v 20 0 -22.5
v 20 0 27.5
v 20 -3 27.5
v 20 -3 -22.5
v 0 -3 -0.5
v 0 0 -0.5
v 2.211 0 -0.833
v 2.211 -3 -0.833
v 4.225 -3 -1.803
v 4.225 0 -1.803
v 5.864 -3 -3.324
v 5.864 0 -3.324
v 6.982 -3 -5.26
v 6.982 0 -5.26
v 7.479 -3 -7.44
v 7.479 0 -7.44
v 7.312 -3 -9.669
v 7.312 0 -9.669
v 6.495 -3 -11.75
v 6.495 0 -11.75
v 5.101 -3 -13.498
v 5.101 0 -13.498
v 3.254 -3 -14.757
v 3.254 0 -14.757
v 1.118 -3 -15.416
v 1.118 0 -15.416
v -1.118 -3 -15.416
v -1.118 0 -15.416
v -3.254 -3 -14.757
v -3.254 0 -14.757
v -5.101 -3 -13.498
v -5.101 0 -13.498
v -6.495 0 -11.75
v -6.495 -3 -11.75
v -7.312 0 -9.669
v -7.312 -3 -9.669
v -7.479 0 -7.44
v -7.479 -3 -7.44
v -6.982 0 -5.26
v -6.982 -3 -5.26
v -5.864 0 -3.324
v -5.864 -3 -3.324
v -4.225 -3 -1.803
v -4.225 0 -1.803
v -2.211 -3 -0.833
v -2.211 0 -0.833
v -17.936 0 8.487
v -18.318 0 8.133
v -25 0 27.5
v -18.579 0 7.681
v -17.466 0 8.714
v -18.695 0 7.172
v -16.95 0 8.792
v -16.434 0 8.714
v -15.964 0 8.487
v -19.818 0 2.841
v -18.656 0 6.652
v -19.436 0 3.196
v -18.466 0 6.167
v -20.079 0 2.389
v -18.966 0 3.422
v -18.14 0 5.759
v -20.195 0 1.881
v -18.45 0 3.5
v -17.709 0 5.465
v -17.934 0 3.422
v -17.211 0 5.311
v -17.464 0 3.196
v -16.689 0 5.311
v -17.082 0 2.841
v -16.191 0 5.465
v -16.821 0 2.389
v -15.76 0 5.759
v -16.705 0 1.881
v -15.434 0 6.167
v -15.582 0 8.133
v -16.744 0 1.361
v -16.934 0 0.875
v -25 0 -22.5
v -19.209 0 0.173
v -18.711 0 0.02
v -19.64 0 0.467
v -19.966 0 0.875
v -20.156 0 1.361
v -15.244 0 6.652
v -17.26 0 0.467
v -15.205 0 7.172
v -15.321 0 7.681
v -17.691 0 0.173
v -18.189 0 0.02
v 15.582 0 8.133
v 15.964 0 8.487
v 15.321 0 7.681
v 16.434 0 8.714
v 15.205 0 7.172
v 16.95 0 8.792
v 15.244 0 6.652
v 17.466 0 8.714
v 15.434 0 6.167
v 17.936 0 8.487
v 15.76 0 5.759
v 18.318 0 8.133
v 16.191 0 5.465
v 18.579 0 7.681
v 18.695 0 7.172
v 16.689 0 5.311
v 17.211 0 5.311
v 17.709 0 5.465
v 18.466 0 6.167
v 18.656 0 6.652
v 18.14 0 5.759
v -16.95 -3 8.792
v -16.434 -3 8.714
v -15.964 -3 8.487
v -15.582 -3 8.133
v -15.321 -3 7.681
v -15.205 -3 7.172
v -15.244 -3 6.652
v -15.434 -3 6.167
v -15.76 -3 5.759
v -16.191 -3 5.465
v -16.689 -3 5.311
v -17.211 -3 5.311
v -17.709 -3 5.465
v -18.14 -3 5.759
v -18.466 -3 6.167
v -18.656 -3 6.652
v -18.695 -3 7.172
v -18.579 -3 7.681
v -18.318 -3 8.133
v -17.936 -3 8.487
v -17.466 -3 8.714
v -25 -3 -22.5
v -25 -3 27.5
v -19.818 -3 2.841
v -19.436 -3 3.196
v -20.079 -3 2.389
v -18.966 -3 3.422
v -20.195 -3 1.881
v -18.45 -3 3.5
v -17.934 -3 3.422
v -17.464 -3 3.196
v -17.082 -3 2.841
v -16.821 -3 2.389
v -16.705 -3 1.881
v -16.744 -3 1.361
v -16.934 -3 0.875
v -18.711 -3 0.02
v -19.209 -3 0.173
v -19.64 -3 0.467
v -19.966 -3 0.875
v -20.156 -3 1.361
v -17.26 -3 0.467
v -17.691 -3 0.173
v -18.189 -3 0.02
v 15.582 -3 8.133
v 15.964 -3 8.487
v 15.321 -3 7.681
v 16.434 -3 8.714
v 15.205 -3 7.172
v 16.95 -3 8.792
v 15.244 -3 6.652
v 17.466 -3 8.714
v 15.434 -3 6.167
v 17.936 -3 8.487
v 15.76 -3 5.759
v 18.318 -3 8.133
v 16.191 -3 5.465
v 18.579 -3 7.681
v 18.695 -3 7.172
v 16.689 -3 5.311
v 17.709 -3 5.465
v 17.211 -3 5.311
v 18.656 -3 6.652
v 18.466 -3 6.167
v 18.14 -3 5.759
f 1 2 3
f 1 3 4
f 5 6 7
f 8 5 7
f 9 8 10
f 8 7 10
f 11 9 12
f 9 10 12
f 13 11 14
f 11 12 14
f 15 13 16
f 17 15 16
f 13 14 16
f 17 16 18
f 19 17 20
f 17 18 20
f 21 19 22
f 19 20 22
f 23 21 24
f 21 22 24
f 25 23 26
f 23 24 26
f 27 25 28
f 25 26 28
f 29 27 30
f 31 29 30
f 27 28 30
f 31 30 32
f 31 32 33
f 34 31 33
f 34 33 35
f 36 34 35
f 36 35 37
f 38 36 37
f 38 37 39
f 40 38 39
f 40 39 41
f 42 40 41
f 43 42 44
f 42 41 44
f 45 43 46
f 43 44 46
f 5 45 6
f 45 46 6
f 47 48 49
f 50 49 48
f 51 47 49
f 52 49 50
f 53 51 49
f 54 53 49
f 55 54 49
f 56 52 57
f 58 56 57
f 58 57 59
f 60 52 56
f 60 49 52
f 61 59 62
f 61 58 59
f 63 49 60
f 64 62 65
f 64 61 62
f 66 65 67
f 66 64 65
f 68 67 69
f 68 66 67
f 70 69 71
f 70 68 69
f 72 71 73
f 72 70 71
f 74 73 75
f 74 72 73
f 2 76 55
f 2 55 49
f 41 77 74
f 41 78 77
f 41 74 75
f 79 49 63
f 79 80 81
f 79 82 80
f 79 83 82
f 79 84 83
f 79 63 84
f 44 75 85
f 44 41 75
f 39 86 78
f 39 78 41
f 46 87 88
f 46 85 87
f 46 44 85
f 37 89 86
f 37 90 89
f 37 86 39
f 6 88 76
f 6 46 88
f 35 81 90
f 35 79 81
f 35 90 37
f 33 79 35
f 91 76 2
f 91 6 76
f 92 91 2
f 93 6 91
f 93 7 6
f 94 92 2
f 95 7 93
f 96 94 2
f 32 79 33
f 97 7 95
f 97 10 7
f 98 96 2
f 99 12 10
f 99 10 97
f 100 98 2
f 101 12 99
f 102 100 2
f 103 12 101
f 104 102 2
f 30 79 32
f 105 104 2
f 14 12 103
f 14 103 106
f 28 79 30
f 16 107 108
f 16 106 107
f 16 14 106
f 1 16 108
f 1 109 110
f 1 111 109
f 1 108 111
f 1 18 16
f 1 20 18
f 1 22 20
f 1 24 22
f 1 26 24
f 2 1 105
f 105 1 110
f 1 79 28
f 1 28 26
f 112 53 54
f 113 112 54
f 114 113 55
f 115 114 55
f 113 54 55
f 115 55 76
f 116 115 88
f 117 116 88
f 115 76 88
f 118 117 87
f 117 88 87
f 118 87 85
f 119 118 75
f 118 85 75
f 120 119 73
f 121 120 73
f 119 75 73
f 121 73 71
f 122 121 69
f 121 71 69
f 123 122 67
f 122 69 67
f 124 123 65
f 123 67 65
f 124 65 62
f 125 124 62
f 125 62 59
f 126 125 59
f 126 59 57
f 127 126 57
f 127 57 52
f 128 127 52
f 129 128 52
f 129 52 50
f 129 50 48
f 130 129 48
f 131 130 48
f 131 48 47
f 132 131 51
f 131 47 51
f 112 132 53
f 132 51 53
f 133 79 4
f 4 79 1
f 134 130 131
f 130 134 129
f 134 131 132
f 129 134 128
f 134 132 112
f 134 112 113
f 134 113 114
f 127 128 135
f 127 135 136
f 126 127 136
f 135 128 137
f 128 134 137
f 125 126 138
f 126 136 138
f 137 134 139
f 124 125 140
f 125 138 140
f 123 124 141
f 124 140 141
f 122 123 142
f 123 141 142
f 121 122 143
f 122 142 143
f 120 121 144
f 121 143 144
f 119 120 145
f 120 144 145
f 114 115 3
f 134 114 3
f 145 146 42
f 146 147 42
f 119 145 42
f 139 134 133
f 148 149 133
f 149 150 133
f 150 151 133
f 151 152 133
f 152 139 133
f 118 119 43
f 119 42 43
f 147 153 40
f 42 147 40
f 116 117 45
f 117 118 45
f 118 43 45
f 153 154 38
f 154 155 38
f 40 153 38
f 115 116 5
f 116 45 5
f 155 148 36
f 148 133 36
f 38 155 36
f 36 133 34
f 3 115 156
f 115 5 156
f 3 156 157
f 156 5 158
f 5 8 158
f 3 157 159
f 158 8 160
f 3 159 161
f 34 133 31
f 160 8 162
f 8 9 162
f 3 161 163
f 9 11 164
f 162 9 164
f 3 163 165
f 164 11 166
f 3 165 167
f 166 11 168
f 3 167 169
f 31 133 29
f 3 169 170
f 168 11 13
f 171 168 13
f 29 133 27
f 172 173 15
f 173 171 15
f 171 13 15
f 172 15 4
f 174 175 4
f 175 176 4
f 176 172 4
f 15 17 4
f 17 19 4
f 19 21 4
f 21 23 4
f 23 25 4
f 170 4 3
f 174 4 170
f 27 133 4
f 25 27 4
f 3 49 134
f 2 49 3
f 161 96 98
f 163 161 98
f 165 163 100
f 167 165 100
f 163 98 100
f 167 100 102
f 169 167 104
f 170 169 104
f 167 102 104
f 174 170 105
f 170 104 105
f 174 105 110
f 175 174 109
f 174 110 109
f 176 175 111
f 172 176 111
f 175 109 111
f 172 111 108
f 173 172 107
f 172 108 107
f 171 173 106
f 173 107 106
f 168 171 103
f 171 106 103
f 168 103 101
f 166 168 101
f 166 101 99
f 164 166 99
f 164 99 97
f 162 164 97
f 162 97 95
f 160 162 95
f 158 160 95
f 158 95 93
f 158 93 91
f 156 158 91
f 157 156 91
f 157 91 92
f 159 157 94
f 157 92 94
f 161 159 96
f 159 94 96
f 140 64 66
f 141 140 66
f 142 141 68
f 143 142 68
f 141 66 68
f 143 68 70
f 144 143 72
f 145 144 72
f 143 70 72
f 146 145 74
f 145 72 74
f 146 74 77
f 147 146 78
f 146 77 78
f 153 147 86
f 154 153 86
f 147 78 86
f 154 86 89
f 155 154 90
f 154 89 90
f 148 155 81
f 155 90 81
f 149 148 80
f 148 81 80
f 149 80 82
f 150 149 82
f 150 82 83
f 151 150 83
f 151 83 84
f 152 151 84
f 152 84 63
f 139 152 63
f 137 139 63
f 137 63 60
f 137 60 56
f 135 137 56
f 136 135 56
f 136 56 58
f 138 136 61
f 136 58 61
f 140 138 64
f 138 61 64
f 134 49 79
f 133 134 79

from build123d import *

# Parameters (mm, degrees)
SKETCH2_W           = 45
SKETCH2_H           = 50
SKETCH2_R           = 7.5
BOSS_EXTRUDE1_DEPTH = 3
SKETCH1_R           = 1.75
CUT_EXTRUDE1_DEPTH  = 3


with BuildPart() as part:
    # Sketch2 → Boss-Extrude1 (new body)
    with BuildSketch(Plane(origin=(0, 0, 0), x_dir=(1, 0, 0), z_dir=(0, 1, 0))):
        with Locations((-2.5, -2.5)):
            Rectangle(SKETCH2_W, SKETCH2_H)
        with Locations(Location((0, 8, 0), (0, 0, 270))):
            Circle(SKETCH2_R, mode=Mode.SUBTRACT)
    extrude(amount=-BOSS_EXTRUDE1_DEPTH)

    # Sketch1 → Cut-Extrude1 (cut)
    with BuildSketch(Plane(origin=(0, 0, 0), x_dir=(1, 0, 0), z_dir=(0, 1, 0))):
        with Locations(Location((-18.45, -1.75, 0), (0, 0, 270))):
            Circle(SKETCH1_R)
        with Locations(Location((16.95, -7.041502622, 0), (0, 0, 270))):
            Circle(SKETCH1_R)
        with Locations(Location((-16.95, -7.041502622, 0), (0, 0, 270))):
            Circle(SKETCH1_R)
    extrude(amount=-CUT_EXTRUDE1_DEPTH, mode=Mode.SUBTRACT)


solid = part.part
